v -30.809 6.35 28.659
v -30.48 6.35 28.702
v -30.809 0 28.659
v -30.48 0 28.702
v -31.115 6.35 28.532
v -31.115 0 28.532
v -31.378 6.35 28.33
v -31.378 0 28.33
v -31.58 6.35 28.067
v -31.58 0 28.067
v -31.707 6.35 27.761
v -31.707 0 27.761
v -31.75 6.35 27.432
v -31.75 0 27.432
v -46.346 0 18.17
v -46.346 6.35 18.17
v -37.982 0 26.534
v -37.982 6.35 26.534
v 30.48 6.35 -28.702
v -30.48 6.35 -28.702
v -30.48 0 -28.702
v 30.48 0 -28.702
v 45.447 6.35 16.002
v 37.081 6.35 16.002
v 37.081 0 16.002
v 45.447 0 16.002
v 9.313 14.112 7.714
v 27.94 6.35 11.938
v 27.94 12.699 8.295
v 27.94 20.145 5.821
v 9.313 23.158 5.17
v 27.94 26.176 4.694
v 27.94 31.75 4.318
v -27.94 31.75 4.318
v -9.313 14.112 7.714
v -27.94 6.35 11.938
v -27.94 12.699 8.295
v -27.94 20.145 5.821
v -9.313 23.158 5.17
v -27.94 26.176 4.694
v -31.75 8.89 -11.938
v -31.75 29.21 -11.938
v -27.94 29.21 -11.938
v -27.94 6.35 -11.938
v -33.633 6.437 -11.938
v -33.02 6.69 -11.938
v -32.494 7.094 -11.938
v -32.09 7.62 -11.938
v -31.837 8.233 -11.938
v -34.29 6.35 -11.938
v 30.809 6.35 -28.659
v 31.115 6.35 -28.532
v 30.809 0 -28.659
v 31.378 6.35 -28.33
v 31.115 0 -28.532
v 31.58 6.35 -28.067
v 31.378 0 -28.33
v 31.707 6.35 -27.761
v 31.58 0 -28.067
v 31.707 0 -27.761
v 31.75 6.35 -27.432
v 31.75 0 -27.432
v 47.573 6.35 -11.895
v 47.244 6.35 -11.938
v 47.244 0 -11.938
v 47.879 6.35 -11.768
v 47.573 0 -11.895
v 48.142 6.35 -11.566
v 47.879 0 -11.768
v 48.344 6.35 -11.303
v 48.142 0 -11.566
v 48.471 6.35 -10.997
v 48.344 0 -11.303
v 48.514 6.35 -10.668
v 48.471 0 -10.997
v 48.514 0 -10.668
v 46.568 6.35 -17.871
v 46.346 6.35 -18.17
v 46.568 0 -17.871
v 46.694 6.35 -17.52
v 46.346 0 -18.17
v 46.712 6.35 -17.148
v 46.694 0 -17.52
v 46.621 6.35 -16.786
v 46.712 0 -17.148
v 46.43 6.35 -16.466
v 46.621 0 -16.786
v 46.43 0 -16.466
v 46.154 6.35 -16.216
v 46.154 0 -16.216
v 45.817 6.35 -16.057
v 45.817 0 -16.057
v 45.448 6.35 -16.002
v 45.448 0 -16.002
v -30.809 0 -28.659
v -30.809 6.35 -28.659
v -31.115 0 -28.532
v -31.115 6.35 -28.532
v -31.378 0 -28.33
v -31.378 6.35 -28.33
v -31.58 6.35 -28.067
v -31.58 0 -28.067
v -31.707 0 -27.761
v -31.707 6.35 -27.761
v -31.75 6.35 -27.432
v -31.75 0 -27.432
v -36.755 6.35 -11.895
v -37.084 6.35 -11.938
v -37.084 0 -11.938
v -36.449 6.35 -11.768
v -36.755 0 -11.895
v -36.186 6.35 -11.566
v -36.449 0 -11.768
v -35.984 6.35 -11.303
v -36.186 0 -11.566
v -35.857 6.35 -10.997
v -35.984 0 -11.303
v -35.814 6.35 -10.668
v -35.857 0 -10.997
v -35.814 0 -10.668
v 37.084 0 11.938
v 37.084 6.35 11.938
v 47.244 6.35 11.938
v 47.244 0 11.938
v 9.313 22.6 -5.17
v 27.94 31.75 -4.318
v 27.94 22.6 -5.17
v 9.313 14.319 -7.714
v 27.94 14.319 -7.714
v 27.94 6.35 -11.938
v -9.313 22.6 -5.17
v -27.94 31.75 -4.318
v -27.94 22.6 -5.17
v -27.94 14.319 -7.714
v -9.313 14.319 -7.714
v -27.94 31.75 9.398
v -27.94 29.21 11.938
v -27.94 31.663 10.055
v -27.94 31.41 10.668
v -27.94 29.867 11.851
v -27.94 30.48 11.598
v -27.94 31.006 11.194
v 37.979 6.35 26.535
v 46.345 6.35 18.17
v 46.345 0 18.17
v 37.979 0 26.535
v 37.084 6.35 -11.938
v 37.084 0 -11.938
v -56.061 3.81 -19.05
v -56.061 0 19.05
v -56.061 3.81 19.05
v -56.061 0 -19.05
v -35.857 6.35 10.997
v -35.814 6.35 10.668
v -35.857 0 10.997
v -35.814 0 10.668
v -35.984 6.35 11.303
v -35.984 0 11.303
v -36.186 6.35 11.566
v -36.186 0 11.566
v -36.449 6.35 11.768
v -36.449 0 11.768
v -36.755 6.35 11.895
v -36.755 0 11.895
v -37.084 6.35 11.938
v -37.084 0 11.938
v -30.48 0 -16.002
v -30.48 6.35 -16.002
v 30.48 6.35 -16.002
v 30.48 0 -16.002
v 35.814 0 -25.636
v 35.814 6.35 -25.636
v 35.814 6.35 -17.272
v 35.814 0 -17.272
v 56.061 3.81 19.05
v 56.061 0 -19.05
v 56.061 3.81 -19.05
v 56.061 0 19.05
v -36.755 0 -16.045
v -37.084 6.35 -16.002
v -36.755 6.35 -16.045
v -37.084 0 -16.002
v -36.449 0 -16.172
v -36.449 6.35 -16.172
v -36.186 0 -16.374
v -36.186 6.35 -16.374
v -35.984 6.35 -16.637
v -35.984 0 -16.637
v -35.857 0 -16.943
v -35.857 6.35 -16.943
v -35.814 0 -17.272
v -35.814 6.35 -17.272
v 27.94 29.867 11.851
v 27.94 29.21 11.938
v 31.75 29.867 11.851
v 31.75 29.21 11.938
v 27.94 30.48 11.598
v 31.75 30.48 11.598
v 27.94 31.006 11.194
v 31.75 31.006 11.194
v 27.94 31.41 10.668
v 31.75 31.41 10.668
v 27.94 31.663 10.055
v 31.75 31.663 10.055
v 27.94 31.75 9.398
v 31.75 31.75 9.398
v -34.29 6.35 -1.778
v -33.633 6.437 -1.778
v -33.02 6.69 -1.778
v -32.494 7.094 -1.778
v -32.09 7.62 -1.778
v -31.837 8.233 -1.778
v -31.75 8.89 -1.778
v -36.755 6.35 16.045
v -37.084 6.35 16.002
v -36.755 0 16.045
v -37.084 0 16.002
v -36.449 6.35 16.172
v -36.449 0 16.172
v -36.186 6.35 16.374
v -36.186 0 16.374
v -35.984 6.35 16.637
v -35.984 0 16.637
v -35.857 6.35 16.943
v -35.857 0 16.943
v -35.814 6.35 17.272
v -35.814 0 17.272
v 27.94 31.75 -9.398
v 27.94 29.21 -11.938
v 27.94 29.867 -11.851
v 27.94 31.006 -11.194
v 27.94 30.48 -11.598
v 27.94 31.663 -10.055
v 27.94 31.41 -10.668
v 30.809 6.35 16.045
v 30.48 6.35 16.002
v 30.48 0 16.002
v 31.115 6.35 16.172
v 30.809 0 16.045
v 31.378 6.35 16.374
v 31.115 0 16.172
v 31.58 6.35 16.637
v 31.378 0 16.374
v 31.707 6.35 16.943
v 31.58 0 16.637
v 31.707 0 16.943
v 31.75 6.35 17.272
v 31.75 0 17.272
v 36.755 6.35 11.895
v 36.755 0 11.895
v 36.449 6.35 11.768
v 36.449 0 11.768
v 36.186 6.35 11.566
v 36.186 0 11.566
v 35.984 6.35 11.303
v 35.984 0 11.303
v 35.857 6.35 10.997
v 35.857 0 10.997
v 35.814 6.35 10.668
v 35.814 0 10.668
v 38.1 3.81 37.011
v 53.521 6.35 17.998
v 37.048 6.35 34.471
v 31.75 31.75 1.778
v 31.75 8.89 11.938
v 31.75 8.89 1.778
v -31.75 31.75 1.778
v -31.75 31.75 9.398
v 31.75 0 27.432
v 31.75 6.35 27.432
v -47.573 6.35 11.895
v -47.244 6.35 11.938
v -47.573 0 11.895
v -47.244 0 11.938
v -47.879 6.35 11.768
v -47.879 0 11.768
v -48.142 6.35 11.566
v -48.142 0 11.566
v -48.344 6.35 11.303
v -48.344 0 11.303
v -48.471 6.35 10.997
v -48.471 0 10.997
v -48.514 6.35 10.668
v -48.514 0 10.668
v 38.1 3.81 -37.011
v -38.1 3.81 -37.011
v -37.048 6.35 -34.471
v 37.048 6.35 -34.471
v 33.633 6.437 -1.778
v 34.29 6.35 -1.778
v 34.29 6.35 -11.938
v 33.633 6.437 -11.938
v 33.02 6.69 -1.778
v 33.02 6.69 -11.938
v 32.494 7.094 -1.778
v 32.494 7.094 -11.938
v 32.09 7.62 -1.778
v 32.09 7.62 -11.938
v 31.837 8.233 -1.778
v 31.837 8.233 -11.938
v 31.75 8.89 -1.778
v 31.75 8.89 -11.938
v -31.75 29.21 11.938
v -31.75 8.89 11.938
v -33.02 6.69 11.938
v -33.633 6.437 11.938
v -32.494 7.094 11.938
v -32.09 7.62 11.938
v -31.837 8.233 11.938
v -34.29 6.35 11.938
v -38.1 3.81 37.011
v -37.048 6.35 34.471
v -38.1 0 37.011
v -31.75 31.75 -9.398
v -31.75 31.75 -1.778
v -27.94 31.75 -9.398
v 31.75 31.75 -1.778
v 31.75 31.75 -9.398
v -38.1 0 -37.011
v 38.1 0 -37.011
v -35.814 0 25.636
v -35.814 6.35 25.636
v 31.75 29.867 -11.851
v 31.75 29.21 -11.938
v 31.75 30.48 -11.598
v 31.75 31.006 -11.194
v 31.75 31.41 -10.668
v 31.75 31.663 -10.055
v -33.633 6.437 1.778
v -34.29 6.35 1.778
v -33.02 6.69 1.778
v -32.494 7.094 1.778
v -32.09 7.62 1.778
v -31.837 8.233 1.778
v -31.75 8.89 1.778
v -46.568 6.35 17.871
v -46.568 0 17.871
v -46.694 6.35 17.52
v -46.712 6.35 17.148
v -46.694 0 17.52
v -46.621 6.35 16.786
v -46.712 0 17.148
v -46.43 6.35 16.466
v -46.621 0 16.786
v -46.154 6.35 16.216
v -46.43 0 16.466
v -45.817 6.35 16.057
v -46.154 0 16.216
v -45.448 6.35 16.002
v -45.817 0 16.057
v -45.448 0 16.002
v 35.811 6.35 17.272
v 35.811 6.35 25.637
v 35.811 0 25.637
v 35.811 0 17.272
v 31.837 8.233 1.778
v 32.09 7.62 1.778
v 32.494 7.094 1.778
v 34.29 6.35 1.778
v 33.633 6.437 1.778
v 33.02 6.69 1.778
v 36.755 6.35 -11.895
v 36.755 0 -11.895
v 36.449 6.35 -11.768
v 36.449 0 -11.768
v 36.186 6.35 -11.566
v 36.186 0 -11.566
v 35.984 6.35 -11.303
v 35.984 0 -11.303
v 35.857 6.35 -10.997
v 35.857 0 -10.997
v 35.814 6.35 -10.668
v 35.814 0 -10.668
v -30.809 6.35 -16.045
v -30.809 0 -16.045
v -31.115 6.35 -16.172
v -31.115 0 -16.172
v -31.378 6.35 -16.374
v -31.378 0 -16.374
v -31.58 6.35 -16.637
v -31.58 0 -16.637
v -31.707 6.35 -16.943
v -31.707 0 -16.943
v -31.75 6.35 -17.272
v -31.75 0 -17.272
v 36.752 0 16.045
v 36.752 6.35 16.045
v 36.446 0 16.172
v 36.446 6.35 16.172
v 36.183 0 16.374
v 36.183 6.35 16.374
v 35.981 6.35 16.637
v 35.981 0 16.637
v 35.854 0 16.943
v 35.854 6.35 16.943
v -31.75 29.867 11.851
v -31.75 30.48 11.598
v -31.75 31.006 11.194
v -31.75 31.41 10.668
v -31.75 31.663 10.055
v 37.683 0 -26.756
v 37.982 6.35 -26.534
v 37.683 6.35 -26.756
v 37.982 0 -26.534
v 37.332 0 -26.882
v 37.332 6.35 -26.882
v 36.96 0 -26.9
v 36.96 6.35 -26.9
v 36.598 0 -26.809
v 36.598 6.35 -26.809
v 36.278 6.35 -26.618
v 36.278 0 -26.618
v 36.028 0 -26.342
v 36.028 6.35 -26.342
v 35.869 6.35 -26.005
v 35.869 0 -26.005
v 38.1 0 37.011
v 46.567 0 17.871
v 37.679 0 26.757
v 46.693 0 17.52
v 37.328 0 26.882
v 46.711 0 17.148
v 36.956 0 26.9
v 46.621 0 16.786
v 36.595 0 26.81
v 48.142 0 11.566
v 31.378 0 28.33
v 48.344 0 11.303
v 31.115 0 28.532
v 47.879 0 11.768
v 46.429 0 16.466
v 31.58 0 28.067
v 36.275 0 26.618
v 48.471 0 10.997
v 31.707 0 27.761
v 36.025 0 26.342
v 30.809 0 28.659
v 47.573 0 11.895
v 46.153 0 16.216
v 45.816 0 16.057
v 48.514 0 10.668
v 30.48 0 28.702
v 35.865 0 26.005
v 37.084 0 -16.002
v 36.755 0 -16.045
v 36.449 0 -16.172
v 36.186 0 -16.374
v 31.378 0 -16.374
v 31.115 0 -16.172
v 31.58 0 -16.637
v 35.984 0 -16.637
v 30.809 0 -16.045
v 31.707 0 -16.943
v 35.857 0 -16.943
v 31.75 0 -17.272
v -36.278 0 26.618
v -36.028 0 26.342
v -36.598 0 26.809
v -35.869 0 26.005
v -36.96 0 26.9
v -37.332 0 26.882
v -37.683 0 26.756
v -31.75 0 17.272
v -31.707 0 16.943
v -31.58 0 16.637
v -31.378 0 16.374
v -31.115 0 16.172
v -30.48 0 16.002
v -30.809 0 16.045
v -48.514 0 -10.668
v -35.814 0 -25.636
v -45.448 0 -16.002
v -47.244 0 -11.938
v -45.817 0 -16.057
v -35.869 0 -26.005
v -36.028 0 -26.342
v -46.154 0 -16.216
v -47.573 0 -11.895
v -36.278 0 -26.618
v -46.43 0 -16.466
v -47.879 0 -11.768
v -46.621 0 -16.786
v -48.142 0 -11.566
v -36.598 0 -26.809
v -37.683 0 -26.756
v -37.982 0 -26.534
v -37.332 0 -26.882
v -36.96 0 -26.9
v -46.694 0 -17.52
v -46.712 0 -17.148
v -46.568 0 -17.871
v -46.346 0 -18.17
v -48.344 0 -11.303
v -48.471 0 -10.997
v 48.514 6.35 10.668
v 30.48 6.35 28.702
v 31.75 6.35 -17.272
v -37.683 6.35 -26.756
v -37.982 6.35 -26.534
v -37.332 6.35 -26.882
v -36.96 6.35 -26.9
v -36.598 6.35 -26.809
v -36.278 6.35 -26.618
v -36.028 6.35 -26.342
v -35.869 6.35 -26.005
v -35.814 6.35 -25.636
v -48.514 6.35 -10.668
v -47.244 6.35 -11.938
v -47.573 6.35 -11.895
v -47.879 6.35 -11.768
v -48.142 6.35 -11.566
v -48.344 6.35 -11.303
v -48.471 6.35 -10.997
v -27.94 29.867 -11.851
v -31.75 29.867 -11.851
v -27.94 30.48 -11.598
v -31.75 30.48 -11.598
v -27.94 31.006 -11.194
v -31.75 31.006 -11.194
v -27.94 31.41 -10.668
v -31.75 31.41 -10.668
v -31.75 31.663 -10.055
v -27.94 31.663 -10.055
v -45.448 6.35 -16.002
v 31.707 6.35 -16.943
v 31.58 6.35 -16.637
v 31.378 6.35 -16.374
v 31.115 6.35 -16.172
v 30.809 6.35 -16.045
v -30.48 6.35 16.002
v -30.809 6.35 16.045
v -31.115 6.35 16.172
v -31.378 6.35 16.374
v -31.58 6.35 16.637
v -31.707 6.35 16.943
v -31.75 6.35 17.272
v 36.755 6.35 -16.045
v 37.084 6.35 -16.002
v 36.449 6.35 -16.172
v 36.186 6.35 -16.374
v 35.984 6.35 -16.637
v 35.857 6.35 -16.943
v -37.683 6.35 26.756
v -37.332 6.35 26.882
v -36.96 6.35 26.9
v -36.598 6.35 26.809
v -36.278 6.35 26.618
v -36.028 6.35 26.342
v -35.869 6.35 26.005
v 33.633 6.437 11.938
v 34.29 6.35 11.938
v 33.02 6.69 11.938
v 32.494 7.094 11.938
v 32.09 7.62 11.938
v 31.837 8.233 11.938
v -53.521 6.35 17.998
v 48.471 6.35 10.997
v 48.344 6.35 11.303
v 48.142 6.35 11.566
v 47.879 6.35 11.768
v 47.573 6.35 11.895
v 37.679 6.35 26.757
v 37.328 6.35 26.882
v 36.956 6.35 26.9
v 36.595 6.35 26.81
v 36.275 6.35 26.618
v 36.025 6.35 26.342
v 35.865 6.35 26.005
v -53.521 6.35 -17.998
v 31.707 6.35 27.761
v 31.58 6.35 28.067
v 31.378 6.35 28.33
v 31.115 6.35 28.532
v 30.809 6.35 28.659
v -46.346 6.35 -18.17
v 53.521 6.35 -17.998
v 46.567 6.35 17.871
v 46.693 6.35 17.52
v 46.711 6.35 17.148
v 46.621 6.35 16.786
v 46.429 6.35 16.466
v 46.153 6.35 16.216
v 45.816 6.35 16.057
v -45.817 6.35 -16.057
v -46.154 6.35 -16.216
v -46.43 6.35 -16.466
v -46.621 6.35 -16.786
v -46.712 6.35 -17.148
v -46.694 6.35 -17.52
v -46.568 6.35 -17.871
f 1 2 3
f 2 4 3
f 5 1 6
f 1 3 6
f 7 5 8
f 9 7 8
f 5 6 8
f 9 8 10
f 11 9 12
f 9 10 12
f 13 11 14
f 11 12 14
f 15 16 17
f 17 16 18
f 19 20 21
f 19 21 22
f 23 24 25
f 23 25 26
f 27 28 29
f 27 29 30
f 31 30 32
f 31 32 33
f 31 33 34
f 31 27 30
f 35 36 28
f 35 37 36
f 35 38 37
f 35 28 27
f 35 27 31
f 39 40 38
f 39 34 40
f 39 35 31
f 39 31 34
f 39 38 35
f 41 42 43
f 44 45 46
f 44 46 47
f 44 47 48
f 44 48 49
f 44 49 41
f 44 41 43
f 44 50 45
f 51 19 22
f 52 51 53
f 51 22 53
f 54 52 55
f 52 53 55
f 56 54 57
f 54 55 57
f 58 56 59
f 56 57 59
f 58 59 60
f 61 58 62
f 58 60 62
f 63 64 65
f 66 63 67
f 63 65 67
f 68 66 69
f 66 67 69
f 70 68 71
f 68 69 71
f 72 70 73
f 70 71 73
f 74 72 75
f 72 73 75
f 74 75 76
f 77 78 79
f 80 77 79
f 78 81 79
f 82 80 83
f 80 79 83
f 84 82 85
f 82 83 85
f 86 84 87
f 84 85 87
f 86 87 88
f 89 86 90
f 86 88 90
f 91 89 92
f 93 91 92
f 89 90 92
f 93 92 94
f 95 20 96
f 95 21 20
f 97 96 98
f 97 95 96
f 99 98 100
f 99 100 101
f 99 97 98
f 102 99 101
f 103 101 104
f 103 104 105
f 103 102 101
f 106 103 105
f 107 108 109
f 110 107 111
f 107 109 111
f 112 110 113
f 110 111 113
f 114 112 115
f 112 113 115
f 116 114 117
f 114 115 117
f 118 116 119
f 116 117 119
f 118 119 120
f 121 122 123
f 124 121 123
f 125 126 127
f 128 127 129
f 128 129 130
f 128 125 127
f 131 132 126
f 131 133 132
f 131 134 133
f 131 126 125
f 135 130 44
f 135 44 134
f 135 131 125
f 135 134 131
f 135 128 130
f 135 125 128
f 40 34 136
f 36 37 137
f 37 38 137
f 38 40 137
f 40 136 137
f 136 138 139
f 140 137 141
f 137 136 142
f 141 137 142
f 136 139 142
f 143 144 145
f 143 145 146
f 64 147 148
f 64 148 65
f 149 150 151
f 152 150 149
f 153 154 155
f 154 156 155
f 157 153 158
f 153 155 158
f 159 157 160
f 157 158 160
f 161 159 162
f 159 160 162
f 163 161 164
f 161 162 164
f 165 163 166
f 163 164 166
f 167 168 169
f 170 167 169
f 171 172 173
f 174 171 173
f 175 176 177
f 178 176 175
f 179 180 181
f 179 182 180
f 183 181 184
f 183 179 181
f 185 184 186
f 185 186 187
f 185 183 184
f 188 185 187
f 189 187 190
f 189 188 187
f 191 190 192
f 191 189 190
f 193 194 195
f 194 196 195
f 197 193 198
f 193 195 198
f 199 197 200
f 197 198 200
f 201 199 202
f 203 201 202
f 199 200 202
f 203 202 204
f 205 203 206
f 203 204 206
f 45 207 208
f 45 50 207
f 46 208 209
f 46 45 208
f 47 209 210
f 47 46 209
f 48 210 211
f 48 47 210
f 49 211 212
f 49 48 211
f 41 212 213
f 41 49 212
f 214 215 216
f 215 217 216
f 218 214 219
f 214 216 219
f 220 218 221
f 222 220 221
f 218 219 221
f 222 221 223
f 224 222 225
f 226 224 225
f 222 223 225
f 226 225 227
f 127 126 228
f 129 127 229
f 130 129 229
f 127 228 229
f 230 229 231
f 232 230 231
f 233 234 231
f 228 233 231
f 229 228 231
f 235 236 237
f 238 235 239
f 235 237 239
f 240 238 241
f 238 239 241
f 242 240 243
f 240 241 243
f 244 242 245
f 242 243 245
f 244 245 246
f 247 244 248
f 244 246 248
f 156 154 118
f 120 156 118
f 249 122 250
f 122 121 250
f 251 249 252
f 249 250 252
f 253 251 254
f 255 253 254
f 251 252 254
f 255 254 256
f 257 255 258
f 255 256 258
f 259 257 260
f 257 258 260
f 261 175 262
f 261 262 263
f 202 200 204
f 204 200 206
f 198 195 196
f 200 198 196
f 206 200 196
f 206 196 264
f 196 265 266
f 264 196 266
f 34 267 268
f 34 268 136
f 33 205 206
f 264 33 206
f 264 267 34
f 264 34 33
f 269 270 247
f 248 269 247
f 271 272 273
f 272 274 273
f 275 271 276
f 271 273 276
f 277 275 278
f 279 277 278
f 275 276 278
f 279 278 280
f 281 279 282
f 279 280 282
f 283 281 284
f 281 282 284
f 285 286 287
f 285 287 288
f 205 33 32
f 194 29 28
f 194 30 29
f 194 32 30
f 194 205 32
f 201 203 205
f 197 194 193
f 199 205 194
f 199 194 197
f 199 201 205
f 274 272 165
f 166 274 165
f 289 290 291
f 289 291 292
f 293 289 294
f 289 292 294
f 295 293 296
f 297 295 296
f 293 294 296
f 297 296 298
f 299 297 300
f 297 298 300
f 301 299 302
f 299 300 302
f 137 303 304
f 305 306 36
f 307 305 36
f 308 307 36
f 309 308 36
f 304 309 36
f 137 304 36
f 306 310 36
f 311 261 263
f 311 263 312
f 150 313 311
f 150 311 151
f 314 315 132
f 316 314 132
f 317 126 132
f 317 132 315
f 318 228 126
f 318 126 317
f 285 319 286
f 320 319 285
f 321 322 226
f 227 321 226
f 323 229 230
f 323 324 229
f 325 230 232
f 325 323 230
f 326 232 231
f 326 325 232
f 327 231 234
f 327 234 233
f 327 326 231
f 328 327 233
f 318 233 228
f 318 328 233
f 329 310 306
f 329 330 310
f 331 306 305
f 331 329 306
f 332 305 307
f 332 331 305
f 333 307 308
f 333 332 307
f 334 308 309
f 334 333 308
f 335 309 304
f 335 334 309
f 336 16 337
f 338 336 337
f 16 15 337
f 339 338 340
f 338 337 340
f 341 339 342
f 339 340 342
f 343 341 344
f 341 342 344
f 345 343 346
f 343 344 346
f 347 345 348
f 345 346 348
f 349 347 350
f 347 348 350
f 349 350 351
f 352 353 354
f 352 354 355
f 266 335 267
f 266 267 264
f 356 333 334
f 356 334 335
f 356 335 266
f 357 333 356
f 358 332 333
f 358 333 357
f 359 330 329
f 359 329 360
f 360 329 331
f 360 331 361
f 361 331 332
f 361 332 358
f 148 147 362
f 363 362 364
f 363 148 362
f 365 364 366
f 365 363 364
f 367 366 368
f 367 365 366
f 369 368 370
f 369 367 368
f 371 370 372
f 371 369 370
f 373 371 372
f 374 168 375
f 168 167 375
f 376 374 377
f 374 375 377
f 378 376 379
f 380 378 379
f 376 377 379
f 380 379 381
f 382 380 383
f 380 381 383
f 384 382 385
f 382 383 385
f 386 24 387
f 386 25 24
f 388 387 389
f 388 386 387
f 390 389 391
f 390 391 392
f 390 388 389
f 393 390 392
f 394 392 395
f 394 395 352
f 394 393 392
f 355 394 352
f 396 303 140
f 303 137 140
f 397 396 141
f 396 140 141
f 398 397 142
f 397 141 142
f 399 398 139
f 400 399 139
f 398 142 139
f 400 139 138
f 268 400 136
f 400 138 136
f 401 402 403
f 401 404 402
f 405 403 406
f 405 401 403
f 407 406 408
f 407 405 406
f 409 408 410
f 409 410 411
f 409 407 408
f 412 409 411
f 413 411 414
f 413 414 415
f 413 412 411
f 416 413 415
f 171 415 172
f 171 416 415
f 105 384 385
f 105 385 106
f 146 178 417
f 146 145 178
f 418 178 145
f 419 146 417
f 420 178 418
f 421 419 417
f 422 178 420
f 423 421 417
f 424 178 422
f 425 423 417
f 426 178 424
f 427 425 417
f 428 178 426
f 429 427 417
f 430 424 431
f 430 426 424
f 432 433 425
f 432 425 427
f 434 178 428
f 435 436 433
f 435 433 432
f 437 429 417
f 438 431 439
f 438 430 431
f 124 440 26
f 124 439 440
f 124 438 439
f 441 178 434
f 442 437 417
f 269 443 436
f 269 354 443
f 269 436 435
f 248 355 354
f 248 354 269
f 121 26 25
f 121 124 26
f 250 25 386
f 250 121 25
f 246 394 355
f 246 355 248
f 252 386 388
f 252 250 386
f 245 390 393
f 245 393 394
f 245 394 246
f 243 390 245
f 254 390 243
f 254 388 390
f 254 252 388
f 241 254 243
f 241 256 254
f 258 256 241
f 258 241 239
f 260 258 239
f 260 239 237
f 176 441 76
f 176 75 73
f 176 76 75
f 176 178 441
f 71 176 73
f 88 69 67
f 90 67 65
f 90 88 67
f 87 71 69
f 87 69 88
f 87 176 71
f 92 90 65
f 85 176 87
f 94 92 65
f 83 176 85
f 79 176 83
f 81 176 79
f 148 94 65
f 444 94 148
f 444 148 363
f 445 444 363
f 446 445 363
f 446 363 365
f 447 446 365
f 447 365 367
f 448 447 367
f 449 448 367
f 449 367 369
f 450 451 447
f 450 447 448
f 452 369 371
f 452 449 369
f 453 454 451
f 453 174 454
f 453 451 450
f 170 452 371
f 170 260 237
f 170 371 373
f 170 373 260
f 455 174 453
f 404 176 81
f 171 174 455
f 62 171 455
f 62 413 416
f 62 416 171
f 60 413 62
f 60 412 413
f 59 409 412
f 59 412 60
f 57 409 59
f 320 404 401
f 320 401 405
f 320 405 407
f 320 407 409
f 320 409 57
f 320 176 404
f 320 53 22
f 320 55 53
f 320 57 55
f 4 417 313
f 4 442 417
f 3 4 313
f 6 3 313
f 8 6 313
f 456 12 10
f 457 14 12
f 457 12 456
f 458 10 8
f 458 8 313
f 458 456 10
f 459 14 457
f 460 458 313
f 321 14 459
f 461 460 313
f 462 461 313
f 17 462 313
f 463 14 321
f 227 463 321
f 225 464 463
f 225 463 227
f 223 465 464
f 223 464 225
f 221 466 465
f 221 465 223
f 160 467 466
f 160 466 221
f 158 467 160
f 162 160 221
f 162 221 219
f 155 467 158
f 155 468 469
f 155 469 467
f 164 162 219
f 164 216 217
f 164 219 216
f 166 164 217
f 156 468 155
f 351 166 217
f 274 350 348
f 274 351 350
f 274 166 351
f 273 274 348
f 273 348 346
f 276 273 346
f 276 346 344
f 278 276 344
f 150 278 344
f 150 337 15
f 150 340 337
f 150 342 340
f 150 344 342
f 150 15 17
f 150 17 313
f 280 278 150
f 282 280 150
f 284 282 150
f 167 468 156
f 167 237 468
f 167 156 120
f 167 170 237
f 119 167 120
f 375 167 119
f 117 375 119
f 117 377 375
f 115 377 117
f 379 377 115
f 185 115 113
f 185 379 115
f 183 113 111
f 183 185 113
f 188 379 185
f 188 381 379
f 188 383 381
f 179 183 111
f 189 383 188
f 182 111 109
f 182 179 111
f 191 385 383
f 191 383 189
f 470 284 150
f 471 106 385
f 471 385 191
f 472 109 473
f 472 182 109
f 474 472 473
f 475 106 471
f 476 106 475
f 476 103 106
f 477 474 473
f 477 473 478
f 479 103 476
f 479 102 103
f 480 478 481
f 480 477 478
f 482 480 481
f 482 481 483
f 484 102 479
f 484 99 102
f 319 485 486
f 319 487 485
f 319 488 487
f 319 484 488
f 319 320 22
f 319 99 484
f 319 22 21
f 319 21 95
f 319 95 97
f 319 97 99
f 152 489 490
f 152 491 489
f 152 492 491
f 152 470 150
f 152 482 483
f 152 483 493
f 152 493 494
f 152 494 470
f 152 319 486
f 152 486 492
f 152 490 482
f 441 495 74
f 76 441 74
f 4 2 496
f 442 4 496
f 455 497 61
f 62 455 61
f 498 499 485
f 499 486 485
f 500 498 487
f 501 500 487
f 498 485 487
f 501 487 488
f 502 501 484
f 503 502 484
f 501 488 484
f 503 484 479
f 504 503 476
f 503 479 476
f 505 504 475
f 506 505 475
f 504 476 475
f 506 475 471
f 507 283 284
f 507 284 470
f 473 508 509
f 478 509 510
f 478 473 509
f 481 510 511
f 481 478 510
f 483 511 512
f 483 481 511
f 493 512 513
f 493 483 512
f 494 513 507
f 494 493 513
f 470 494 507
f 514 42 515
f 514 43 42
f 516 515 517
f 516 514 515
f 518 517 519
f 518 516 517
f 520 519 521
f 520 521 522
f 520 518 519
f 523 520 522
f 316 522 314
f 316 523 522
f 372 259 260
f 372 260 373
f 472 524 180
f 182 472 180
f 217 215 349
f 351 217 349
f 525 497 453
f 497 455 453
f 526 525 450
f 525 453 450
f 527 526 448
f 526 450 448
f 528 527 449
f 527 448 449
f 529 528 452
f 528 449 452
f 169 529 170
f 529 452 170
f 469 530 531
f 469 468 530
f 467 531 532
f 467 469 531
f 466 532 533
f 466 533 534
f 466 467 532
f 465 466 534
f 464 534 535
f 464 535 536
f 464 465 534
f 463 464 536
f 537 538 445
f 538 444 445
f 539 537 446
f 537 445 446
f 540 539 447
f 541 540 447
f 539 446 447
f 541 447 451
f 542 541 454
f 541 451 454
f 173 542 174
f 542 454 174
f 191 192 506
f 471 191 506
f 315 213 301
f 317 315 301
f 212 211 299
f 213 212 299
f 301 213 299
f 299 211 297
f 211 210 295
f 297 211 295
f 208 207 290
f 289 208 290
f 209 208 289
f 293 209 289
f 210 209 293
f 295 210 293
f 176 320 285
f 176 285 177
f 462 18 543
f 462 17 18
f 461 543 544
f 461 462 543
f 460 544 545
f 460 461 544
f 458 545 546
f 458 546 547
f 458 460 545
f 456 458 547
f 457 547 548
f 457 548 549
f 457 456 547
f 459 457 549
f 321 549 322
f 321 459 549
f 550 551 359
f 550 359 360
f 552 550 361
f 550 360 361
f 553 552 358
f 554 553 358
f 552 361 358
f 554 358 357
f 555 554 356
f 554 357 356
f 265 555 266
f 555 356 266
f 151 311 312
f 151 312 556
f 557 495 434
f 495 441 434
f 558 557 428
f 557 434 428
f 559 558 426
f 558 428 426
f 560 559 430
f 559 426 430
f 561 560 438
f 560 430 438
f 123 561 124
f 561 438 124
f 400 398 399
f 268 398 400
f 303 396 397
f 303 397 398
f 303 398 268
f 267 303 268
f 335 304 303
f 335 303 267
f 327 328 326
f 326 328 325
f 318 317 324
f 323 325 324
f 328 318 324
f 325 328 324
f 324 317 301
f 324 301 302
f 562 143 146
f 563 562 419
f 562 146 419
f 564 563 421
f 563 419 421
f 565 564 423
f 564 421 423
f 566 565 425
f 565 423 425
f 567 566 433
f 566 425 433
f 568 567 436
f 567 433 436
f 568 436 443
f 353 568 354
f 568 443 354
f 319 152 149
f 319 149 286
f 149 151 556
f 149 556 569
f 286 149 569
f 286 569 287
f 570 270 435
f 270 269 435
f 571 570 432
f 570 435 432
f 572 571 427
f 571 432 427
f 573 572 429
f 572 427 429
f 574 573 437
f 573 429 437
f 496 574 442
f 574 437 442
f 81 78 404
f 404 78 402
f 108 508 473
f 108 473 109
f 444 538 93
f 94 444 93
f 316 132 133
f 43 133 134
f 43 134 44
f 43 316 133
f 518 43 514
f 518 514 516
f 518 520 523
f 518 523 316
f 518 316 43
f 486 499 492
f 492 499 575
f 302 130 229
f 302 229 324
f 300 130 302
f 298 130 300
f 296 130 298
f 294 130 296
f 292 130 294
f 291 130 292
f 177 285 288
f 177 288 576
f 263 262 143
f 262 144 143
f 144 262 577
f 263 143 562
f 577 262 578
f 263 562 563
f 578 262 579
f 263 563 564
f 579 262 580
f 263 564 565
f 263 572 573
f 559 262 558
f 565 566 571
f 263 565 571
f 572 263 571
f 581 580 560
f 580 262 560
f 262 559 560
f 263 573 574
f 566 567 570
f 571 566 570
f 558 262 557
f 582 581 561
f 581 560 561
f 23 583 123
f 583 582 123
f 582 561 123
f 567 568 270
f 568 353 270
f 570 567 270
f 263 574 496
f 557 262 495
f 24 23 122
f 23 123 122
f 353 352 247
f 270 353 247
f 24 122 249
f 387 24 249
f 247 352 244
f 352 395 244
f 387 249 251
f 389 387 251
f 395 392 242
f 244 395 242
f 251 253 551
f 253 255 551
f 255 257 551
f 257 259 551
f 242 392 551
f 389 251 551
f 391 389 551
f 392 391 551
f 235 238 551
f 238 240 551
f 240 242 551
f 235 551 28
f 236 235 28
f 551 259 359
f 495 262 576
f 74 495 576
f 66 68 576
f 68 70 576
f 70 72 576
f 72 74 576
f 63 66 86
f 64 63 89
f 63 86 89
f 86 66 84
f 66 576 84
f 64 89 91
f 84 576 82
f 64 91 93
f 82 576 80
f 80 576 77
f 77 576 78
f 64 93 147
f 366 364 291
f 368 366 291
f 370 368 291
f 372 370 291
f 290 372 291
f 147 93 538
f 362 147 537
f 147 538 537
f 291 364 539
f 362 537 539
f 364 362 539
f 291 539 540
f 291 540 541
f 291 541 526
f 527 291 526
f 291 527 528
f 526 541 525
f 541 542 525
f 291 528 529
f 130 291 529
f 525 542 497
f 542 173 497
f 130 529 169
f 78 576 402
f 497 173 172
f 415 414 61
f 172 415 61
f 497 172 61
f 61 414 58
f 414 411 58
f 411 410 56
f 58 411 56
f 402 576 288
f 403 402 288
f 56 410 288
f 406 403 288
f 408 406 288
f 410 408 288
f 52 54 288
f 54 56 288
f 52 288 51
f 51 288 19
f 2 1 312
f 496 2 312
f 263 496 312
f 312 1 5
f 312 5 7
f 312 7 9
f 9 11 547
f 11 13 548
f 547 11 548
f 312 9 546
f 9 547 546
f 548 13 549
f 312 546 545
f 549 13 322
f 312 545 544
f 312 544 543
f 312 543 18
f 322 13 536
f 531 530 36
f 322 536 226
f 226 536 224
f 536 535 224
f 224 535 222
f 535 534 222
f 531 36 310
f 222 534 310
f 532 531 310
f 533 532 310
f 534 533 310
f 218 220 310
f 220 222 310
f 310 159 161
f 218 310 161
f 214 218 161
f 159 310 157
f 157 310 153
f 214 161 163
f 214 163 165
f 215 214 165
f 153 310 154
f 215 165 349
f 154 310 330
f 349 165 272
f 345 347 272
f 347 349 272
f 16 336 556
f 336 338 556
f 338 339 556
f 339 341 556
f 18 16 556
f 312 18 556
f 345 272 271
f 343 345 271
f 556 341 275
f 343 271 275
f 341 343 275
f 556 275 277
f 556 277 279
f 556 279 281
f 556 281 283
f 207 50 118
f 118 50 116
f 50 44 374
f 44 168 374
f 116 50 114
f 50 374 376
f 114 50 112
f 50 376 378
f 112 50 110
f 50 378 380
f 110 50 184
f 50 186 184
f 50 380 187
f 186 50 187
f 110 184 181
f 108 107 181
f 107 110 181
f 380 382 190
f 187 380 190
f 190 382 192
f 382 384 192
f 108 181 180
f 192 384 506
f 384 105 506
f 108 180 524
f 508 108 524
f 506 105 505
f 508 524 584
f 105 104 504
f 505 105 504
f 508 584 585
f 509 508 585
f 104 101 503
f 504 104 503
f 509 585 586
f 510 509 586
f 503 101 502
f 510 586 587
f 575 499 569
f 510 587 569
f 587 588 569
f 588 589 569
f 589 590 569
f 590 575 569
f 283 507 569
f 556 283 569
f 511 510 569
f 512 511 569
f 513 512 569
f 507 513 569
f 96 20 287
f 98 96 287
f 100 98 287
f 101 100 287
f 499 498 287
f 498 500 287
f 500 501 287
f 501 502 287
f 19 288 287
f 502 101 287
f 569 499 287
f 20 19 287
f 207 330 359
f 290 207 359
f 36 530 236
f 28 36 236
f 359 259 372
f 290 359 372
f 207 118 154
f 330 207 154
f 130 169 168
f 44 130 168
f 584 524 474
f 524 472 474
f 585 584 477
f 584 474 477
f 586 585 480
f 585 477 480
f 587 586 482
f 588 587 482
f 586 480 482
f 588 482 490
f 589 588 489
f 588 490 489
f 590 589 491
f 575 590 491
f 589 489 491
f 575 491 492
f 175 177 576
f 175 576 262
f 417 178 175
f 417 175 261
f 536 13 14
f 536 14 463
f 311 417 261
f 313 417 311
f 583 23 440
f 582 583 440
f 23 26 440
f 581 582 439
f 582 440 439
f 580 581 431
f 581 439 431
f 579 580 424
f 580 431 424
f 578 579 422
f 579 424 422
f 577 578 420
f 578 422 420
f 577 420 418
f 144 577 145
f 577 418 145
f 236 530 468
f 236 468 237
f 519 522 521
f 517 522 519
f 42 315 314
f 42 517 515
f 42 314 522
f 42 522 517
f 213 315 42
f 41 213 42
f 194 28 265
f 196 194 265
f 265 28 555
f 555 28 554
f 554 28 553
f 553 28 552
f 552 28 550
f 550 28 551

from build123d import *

# Parameters (mm, degrees)
BOSS_EXTRUDE1_DEPTH     = 6.35
SKETCH2_W               = 63.5
SKETCH2_H               = 10.16
BOSS_EXTRUDE2_DEPTH     = 25.4
SKETCH2_3_W             = 63.5
SKETCH2_3_H             = 12.7
SKETCH2_3_W_2           = 12.7
SKETCH2_3_H_2           = 23.876
CUT_EXTRUDE2_DEPTH      = 72.817261499
CUT_EXTRUDE1_DEPTH      = 27.94
CUT_EXTRUDE1_DEPTH_BACK = 27.94
FILLET1_R               = 2.54
CHAMFER1_SIZE           = 2.54
FILLET2_R               = 2.54
FILLET3_R               = 1.27


with BuildPart() as part:
    # Sketch1 → Boss-Extrude1 (new body)
    with BuildSketch(Plane(origin=(0, 0, 0), x_dir=(1, 0, 0), z_dir=(0, 1, 0))):
        Polygon((-38.1, 37.010512242), (38.1, 37.010512242), (56.060512242, 19.05), (56.060512242, -19.05), (38.1, -37.010512242), (-38.1, -37.010512242), (-56.060512242, -19.05), (-56.060512242, 19.05), align=None)
    extrude(amount=BOSS_EXTRUDE1_DEPTH)

    # Sketch2 → Boss-Extrude2 (add)
    with BuildSketch(Plane(origin=(0, 6.35, 0), x_dir=(1, 0, 0), z_dir=(0, 1, 0))):
        with Locations((0, 6.858)):
            Rectangle(SKETCH2_W, SKETCH2_H)
        with Locations((0, -6.858)):
            Rectangle(SKETCH2_W, SKETCH2_H)
    extrude(amount=BOSS_EXTRUDE2_DEPTH)

    # Sketch2<3> → Cut-Extrude2 (cut, through all)
    with BuildSketch(Plane(origin=(0, 6.35, 0), x_dir=(1, 0, 0), z_dir=(0, 1, 0))):
        Polygon((48.514, -16.002), (35.810678974, -16.002), (35.810678974, -28.702), align=None)
        with Locations((0, -22.352)):
            Rectangle(SKETCH2_3_W, SKETCH2_3_H)
        with Locations((0, 22.352)):
            Rectangle(SKETCH2_3_W, SKETCH2_3_H)
        with Locations((42.164, 0)):
            Rectangle(SKETCH2_3_W_2, SKETCH2_3_H_2)
        with Locations((-42.164, 0)):
            Rectangle(SKETCH2_3_W_2, SKETCH2_3_H_2)
        Polygon((48.514, 16.002), (35.814, 28.702), (35.814, 16.002), align=None)
        Polygon((-48.514, 16.002), (-35.814, 16.002), (-35.814, 28.702), align=None)
        Polygon((-48.514, -16.002), (-35.814, -28.702), (-35.814, -16.002), align=None)
    extrude(amount=-CUT_EXTRUDE2_DEPTH, mode=Mode.SUBTRACT)

    # Sketch3 → Cut-Extrude1 (cut, two sides: drawn at the far end of the back side and taken through both)
    with BuildSketch(Plane(origin=(0, 0, 0), x_dir=(0, 0, -1), z_dir=(1, 0, 0)).offset(-CUT_EXTRUDE1_DEPTH_BACK)):
        with BuildLine():
            Line((-11.938, 31.75), (-4.318, 31.75))
            add(Edge.make_bspline(
                [(-11.938, 6.35), (-6.879920458, 12.89035907), (-4.318, 23.963686989), (-4.318, 31.75)],
                knots=[0, 0, 0, 0, 1, 1, 1, 1], degree=3))
            Line((-11.938, 6.35), (-11.938, 31.75))
        make_face()
        with BuildLine():
            Line((11.938, 6.35), (11.938, 31.75))
            Line((11.938, 31.75), (4.318, 31.75))
            add(Edge.make_bspline(
                [(4.318, 31.75), (4.318, 21.978725734), (6.879920458, 14.349731609), (11.938, 6.35)],
                knots=[0, 0, 0, 0, 1, 1, 1, 1], degree=3))
        make_face()
    extrude(amount=CUT_EXTRUDE1_DEPTH + CUT_EXTRUDE1_DEPTH_BACK, mode=Mode.SUBTRACT)

    # Fillet1
    fillet1_edges = [part.edges().sort_by_distance(p)[0] for p in [
        (-29.845, 31.75, 11.938),
        (-29.845, 31.75, -11.938),
        (29.845, 31.75, 11.938),
        (29.845, 31.75, -11.938),
    ]]
    fillet(fillet1_edges, radius=FILLET1_R)

    # Chamfer1
    chamfer1_edges = [part.edges().sort_by_distance(p)[0] for p in [
        (-47.080256121, 6.35, -28.030256121),
        (-56.060512242, 6.35, 0),
        (-47.080256121, 6.35, 28.030256121),
        (0, 6.35, 37.010512242),
        (47.080256121, 6.35, 28.030256121),
        (56.060512242, 6.35, 0),
        (47.080256121, 6.35, -28.030256121),
        (0, 6.35, -37.010512242),
    ]]
    chamfer(chamfer1_edges, length=CHAMFER1_SIZE)

    # Fillet2
    fillet2_edges = [part.edges().sort_by_distance(p)[0] for p in [
        (31.75, 6.35, 6.858),
        (-31.75, 6.35, 6.858),
        (-31.75, 6.35, -6.858),
        (31.75, 6.35, -6.858),
    ]]
    fillet(fillet2_edges, radius=FILLET2_R)

    # Fillet3
    fillet3_edges = [part.edges().sort_by_distance(p)[0] for p in [
        (-31.75, 3.175, -16.002),
        (-31.75, 3.175, -28.702),
        (31.75, 3.175, -16.002),
        (31.75, 3.175, -28.702),
        (35.814, 3.175, -16.002),
        (35.814, 3.175, -28.702),
        (48.514, 3.175, -16.002),
        (48.514, 3.175, 11.938),
        (35.814, 3.175, 11.938),
        (35.814, 3.175, -11.938),
        (48.514, 3.175, -11.938),
        (-35.814, 3.175, -28.702),
        (-35.814, 3.175, -16.002),
        (-48.514, 3.175, -16.002),
        (-48.514, 3.175, 11.938),
        (-48.514, 3.175, -11.938),
        (-35.814, 3.175, -11.938),
        (-35.814, 3.175, 11.938),
        (-48.514, 3.175, 16.002),
        (-35.814, 3.175, 16.002),
        (-35.814, 3.175, 28.702),
        (-31.75, 3.175, 28.702),
        (-31.75, 3.175, 16.002),
        (31.75, 3.175, 16.002),
        (31.75, 3.175, 28.702),
        (35.810678974, 3.175, 28.702),
        (35.810678974, 3.175, 16.002),
        (48.514, 3.175, 16.002),
    ]]
    fillet(fillet3_edges, radius=FILLET3_R)


solid = part.part
